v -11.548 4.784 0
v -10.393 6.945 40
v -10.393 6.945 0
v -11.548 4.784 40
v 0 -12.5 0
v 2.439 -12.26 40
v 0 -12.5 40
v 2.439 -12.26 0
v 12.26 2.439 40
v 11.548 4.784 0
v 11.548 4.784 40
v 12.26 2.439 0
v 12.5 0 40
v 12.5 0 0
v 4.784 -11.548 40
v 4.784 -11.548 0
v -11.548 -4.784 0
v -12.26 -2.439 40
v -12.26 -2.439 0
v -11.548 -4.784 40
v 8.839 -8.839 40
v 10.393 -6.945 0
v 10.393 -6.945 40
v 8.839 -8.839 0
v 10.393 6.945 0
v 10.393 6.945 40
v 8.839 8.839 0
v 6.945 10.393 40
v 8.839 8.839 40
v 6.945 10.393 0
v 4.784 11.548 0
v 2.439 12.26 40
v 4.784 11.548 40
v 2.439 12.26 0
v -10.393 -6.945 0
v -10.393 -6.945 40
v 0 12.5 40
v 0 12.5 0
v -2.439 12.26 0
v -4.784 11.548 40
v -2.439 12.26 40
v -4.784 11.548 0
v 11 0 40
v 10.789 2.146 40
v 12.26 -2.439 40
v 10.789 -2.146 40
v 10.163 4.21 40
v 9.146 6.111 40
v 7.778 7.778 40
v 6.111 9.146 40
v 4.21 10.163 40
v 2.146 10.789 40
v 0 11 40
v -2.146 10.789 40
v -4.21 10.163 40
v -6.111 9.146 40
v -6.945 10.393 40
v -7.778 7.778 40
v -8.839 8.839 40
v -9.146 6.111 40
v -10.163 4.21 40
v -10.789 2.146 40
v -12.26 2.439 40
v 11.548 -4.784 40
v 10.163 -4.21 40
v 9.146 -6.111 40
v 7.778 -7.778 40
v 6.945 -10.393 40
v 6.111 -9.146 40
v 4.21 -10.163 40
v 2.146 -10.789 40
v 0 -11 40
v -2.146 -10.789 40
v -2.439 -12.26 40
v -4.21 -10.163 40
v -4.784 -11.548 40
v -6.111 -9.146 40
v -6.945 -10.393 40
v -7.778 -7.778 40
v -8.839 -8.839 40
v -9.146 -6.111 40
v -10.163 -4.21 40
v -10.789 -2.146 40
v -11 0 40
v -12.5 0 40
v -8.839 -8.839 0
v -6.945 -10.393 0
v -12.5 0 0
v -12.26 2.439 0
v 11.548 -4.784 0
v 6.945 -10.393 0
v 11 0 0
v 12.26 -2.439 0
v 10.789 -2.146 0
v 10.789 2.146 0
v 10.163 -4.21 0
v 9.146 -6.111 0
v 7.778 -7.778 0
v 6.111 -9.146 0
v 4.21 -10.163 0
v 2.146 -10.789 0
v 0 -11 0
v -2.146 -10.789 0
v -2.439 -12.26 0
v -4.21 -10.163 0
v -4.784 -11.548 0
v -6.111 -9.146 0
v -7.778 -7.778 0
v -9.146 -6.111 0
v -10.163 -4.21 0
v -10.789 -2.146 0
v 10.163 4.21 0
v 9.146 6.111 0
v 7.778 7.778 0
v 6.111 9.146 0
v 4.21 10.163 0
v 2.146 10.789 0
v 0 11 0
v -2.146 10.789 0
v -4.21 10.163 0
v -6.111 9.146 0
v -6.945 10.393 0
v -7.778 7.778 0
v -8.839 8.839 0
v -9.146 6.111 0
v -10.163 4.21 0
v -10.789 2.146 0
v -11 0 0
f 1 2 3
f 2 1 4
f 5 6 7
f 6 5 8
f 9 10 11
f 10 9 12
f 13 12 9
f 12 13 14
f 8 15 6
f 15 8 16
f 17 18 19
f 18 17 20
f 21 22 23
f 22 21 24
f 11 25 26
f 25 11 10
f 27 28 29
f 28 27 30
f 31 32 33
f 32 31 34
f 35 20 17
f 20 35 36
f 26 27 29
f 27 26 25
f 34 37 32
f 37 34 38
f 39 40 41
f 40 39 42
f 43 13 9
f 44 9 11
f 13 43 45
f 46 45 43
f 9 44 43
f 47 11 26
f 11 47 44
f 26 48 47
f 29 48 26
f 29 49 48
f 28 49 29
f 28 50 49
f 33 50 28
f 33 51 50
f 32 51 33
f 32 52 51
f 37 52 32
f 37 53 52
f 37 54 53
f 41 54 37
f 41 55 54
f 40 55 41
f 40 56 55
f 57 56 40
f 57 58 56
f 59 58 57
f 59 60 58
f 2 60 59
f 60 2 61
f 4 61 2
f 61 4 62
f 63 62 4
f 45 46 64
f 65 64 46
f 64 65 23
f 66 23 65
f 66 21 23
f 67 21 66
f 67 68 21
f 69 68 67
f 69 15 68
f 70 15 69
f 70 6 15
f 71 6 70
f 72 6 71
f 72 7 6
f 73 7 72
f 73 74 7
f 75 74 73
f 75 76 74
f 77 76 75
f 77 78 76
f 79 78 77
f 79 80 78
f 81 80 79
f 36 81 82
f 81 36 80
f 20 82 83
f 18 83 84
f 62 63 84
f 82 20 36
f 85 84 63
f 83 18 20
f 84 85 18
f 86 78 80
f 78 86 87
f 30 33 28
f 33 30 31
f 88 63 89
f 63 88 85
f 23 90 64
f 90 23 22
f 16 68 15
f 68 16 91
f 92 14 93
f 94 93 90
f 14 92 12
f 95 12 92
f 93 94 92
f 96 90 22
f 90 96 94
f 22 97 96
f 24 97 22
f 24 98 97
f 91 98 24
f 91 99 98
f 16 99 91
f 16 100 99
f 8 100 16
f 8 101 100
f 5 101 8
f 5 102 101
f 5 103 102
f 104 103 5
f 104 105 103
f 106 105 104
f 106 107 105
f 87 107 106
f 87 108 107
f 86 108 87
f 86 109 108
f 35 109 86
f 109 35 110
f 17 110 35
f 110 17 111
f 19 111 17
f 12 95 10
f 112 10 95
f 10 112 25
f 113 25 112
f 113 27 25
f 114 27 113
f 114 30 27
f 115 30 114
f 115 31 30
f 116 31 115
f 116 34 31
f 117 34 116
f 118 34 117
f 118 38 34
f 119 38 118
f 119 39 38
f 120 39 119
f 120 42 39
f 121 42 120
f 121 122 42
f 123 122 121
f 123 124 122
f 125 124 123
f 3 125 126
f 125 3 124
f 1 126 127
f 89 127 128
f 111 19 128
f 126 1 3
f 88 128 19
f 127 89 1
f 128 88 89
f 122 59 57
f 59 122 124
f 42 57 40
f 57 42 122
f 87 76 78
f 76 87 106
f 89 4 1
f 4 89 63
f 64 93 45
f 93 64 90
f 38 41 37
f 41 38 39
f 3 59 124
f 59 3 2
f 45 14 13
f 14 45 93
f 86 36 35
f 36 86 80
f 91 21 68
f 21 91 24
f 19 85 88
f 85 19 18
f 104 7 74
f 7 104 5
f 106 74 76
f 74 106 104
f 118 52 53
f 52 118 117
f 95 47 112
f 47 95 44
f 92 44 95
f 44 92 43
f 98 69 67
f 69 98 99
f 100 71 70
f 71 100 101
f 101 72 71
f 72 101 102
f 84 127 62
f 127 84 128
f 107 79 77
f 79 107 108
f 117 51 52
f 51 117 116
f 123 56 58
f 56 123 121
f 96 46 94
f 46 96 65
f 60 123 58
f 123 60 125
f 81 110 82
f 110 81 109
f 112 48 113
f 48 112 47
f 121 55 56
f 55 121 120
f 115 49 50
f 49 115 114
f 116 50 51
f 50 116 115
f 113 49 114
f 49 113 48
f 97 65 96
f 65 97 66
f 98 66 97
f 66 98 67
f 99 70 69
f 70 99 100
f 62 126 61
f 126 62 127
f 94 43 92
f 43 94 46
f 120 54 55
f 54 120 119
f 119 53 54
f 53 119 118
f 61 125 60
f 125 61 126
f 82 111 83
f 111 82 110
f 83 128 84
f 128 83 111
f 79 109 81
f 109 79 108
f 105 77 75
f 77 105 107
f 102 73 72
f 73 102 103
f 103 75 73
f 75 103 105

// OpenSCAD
$fn = 32;

// ----------------------------------------------------------------------
// Thin tube: 1.5 mm wall
// ----------------------------------------------------------------------

// --- parameters (mm) ---
tube_od = 25;             // outer diameter
tube_h = 40;              // height, Z
wall = 1.5;               // wall thickness

difference() {
  cylinder(h = tube_h, d = tube_od);
  translate([0, 0, -1]) cylinder(h = tube_h + 2, d = tube_od - 2 * wall);
}
